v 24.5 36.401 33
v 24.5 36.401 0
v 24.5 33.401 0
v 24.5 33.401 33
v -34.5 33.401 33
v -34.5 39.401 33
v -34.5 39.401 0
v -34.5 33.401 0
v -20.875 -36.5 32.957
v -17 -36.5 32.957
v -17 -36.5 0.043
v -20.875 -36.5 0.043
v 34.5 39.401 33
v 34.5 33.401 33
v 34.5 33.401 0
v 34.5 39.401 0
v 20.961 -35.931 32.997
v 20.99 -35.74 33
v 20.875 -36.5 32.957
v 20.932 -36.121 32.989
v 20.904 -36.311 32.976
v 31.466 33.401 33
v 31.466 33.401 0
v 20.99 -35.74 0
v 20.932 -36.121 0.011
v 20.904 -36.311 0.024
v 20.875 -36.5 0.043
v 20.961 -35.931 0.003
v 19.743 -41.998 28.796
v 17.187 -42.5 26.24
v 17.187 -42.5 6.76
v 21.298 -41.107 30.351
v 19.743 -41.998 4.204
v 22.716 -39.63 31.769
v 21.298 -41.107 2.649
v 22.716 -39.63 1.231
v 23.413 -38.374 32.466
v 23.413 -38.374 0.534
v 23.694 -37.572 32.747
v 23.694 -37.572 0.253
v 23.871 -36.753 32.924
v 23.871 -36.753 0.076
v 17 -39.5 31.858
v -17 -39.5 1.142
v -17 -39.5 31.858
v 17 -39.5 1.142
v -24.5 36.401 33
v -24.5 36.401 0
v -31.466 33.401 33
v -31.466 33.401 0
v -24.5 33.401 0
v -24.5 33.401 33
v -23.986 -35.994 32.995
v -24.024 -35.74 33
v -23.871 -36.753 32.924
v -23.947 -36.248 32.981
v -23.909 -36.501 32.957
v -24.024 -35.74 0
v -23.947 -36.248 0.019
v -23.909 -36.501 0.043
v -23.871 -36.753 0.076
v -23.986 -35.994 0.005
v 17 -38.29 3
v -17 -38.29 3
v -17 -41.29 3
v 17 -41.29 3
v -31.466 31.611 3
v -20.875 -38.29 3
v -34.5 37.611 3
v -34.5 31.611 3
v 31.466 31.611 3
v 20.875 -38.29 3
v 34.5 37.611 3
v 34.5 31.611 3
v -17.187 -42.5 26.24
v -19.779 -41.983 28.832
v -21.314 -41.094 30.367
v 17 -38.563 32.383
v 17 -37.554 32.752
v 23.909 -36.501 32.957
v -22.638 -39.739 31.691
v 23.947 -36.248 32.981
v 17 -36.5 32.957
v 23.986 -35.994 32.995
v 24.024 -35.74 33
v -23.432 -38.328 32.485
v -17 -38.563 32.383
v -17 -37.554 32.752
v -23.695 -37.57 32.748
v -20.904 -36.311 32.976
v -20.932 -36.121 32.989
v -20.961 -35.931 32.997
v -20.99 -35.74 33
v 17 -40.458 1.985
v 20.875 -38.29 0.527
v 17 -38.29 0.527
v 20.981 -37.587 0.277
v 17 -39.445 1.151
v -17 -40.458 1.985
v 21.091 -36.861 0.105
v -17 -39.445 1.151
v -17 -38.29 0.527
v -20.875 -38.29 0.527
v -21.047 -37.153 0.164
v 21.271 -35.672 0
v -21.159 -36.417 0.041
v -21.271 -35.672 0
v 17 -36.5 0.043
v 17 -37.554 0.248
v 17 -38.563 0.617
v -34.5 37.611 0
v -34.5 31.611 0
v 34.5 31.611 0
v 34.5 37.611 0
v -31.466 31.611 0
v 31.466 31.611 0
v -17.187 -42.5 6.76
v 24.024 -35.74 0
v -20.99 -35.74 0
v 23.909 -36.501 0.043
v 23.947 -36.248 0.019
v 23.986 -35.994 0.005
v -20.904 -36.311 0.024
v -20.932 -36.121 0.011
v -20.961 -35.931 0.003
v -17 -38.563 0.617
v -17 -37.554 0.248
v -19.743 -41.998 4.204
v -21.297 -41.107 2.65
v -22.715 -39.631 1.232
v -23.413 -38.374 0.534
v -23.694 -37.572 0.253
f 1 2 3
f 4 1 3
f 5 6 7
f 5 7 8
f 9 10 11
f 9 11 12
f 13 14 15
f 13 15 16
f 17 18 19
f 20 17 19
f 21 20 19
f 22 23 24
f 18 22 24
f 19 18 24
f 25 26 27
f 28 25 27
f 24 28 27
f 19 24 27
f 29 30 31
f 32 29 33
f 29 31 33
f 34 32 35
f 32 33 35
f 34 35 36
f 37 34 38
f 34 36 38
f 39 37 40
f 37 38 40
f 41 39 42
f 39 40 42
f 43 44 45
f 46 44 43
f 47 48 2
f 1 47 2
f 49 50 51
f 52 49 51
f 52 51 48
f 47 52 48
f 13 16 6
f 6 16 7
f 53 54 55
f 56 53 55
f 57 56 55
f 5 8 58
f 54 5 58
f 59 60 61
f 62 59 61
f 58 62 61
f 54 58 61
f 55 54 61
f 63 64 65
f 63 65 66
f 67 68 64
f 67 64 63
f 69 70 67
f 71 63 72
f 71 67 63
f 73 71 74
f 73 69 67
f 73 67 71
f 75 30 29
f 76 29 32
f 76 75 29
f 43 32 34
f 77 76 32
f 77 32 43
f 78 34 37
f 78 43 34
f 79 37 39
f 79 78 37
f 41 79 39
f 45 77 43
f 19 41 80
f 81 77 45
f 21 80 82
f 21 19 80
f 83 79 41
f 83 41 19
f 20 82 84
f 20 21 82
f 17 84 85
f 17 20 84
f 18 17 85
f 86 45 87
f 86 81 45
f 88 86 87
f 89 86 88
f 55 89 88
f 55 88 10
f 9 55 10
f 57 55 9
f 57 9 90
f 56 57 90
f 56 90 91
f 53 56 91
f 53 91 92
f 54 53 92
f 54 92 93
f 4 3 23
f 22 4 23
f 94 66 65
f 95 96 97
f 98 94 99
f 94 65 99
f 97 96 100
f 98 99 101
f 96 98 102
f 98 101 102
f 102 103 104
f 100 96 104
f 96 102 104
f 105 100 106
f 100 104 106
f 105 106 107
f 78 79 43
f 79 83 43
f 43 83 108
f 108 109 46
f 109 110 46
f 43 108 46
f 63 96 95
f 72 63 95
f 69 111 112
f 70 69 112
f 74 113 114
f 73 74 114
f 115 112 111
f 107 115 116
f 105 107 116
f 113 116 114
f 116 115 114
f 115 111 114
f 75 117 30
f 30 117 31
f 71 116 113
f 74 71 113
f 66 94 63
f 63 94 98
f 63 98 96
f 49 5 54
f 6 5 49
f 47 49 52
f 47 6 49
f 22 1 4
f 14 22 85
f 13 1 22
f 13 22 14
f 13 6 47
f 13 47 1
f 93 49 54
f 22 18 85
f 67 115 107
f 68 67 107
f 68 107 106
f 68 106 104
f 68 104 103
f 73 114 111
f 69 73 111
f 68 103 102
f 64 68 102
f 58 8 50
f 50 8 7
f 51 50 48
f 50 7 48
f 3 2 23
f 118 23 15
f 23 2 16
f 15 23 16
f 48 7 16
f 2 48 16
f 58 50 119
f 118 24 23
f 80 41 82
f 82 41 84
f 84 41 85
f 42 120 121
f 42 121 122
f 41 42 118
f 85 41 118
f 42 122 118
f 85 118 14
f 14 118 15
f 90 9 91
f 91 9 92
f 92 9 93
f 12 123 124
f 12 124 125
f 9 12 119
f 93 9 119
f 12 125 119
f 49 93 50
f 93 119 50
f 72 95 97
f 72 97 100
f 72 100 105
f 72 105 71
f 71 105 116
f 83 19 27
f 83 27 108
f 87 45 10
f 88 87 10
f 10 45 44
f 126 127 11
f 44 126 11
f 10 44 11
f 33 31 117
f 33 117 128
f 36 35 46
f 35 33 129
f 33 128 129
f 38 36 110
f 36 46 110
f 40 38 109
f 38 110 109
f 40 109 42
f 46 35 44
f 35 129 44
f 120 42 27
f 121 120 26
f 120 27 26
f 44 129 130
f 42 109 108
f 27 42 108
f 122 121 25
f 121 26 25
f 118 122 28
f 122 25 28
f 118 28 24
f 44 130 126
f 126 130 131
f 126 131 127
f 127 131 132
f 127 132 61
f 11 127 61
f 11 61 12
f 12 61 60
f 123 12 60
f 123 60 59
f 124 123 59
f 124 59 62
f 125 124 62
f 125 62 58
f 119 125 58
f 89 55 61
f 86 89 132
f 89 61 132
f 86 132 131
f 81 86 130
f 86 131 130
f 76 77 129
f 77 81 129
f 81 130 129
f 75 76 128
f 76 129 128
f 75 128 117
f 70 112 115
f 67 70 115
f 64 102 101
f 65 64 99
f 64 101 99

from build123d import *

# Parameters (mm, degrees)
F0_W          = 34
F0_H          = 3
F1_DEPTH      = 33
F3_DEPTH      = 3
F4_T1_DEPTH   = 62.0637231031
F4_T3_DEPTH   = 79.7989898732
F4_2_T1_DEPTH = 62.0886043833


# Not quite as in the source:
# - a fillet or chamfer that OpenCascade refuses, or shapes differently, is made with other operations: its cross-section is extruded or revolved along the edge and cut away or added


with BuildPart() as f1:
    # F0 (on Top) → F1 (new body)
    with BuildSketch(Plane.XY):
        Polygon((-34.5, 39.400604268), (-34.5, 36.400604268), (-24.5, 36.400604268), (24.5, 36.400604268), (34.5, 36.400604268), (34.5, 39.400604268), align=None)
        Polygon((-24.5, 36.400604268), (-34.5, 36.400604268), (-34.5, 33.400604268), (-31.4657606752, 33.400604268), (-24.5, 33.400604268), align=None)
        Polygon((34.5, 36.400604268), (24.5, 36.400604268), (24.5, 33.400604268), (31.4657606752, 33.400604268), (34.5, 33.400604268), align=None)
        Polygon((-23, -39.5), (-23, -42.5), (-17, -42.5), (-17, -39.5), (-20.4203025109, -39.5), align=None)
        Polygon((-17, -36.5), (-20.8748443467, -36.5), (-20.4203025109, -39.5), (-17, -39.5), align=None)
        Polygon((-20.4203025109, -39.5), (-20.8748443467, -36.5), (-23, -36.5), (-23, -39.5), align=None)
        Polygon((20.4203025109, -39.5), (20.8748443467, -36.5), (17, -36.5), (17, -39.5), align=None)
        Polygon((17, -39.5), (17, -42.5), (23, -42.5), (23, -39.5), (20.4203025109, -39.5), align=None)
        Polygon((23, -36.5), (20.8748443467, -36.5), (20.4203025109, -39.5), (23, -39.5), align=None)
        Polygon((23, -42.5), (34.5, 33.400604268), (31.4657606752, 33.400604268), (20.8748443467, -36.5), (23, -36.5), (23, -39.5), align=None)
        Polygon((-31.4657606752, 33.400604268), (-34.5, 33.400604268), (-23, -42.5), (-23, -39.5), (-23, -36.5), (-20.8748443467, -36.5), align=None)
        with Locations((0, -41)):
            Rectangle(F0_W, F0_H)
    extrude(amount=F1_DEPTH)

    # F4: fillet of radius 6.7597979746 on 4 edges, made by hand

    # F4_s2 → F4_t1 (cut)
    with BuildSketch(Plane.XY.offset(-14.5318615516)):
        with BuildLine():
            ThreePointArc((-23.8707736364, -36.7528482447), (-21.5946120019, -40.8656362762), (-17.1872553794, -42.5))
            Line((-17.1872553794, -42.5), (-23, -42.5))
            Line((-23, -42.5), (-23.8707736364, -36.7528482447))
        make_face()
        with BuildLine():
            ThreePointArc((17.1872553794, -42.5), (21.5946120019, -40.8656362762), (23.8707736364, -36.7528482447))
            Line((23.8707736364, -36.7528482447), (23, -42.5))
            Line((23, -42.5), (17.1872553794, -42.5))
        make_face()
    extrude(amount=F4_T1_DEPTH, mode=Mode.SUBTRACT)

    # F4_s4 → F4_t3 (cut)
    with BuildSketch(Plane.YZ.offset(-39.8994949366)):
        with BuildLine():
            ThreePointArc((-42.5, 6.7597979746), (-40.5201010127, 1.9798989873), (-35.7402020254, 0))
            Line((-35.7402020254, 0), (-42.5, 0))
            Line((-42.5, 0), (-42.5, 6.7597979746))
        make_face()
        with BuildLine():
            ThreePointArc((-42.5, 26.2402020254), (-40.5201010127, 31.0201010127), (-35.7402020254, 33))
            Line((-35.7402020254, 33), (-42.5, 33))
            Line((-42.5, 33), (-42.5, 26.2402020254))
        make_face()
    extrude(amount=F4_T3_DEPTH, mode=Mode.SUBTRACT)


with BuildPart() as f3:
    # F2 (on Top) → F3 (new body)
    with BuildSketch(Plane.XY):
        Polygon((24.5, 34.6106770507), (-24.5, 34.6106770507), (-24.5, 31.6106770507), (-31.4657606752, 31.6106770507), (-20.8748443467, -38.2899272173), (-17, -38.2899272173), (-17, -41.2899272173), (17, -41.2899272173), (17, -38.2899272173), (20.8748443467, -38.2899272173), (31.4657606752, 31.6106770507), (24.5, 31.6106770507), align=None)
        Polygon((-34.5, 37.6106770507), (-34.5, 34.6106770507), (-24.5, 34.6106770507), (24.5, 34.6106770507), (34.5, 34.6106770507), (34.5, 37.6106770507), align=None)
        Polygon((34.5, 34.6106770507), (24.5, 34.6106770507), (24.5, 31.6106770507), (31.4657606752, 31.6106770507), (34.5, 31.6106770507), align=None)
        Polygon((-24.5, 34.6106770507), (-34.5, 34.6106770507), (-34.5, 31.6106770507), (-31.4657606752, 31.6106770507), (-24.5, 31.6106770507), align=None)
    extrude(amount=F3_DEPTH)

    # F4#2: fillet of radius 6.7597979746 on 1 edges, made by hand

    # F4_2_s2 → F4_2_t1 (cut)
    with BuildSketch(Plane.YZ.offset(-31.0443021916)):
        with BuildLine():
            ThreePointArc((-41.2899272173, 3), (-38.8564954233, 0.7969822223), (-35.6722063406, 0))
            Line((-35.6722063406, 0), (-41.2899272173, 0))
            Line((-41.2899272173, 0), (-41.2899272173, 3))
        make_face()
    extrude(amount=F4_2_T1_DEPTH, mode=Mode.SUBTRACT)


solid = Compound([f1.part, f3.part])
